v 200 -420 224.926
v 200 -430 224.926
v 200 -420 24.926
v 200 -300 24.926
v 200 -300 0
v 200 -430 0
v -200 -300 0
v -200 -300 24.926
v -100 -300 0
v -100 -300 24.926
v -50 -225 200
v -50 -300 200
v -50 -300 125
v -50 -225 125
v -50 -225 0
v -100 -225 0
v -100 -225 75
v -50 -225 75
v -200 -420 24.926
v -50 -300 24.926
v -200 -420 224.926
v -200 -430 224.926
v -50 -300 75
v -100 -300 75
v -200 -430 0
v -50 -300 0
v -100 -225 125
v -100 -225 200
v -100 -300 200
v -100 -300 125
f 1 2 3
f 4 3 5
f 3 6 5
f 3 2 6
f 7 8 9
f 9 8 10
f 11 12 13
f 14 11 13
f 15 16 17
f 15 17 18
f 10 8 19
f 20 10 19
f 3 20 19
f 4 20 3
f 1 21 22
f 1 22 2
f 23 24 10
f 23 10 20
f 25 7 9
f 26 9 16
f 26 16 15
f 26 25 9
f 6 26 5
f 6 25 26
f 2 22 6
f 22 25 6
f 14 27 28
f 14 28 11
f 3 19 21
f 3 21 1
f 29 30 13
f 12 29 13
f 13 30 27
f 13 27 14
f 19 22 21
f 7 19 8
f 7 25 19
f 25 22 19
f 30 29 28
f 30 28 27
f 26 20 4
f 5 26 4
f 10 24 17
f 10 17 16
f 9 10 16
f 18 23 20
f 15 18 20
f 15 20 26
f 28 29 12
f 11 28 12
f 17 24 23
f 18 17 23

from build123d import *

# Parameters (mm, degrees)
SKETCH4_W           = 400
SKETCH4_H           = 24.926147639
BOSS_EXTRUDE1_DEPTH = 130
SKETCH5_W           = 400
SKETCH5_H           = 10
BOSS_EXTRUDE2_DEPTH = 200
SKETCH12_W          = 50
SKETCH12_H          = 75
BOSS_EXTRUDE3_DEPTH = 75


with BuildPart() as part:
    # Sketch4 → Boss-Extrude1 (new body)
    with BuildSketch(Plane.XZ.offset(300)):
        with Locations((0, 12.463073819)):
            Rectangle(SKETCH4_W, SKETCH4_H)
    extrude(amount=BOSS_EXTRUDE1_DEPTH)

    # Sketch5 → Boss-Extrude2 (add)
    with BuildSketch(Plane.XY.offset(24.926147639)):
        with Locations((0, -425)):
            Rectangle(SKETCH5_W, SKETCH5_H)
    extrude(amount=BOSS_EXTRUDE2_DEPTH)

    # Sketch12 → Boss-Extrude3 (add)
    with BuildSketch(Plane(origin=(0, -300, 0), x_dir=(1, 0, 0), z_dir=(0, 1, 0))):
        with Locations((-75, -162.5)):
            Rectangle(SKETCH12_W, SKETCH12_H)
        with Locations((-75, -37.5)):
            Rectangle(SKETCH12_W, SKETCH12_H)
    extrude(amount=BOSS_EXTRUDE3_DEPTH)


with BuildPart() as boss_extrude3_piece_1:
    # of the separate pieces the step leaves, piece 1, a body of its own (boss_extrude3_pieces)
    add(part.part.solids().sort_by_distance((-200, -300, 0))[0])


with BuildPart() as boss_extrude3_piece_2:
    # of the separate pieces the step leaves, piece 2, a body of its own (boss_extrude3_pieces)
    add(part.part.solids().sort_by_distance((-100, -300, 125))[0])


solid = Compound([boss_extrude3_piece_1.part, boss_extrude3_piece_2.part])
